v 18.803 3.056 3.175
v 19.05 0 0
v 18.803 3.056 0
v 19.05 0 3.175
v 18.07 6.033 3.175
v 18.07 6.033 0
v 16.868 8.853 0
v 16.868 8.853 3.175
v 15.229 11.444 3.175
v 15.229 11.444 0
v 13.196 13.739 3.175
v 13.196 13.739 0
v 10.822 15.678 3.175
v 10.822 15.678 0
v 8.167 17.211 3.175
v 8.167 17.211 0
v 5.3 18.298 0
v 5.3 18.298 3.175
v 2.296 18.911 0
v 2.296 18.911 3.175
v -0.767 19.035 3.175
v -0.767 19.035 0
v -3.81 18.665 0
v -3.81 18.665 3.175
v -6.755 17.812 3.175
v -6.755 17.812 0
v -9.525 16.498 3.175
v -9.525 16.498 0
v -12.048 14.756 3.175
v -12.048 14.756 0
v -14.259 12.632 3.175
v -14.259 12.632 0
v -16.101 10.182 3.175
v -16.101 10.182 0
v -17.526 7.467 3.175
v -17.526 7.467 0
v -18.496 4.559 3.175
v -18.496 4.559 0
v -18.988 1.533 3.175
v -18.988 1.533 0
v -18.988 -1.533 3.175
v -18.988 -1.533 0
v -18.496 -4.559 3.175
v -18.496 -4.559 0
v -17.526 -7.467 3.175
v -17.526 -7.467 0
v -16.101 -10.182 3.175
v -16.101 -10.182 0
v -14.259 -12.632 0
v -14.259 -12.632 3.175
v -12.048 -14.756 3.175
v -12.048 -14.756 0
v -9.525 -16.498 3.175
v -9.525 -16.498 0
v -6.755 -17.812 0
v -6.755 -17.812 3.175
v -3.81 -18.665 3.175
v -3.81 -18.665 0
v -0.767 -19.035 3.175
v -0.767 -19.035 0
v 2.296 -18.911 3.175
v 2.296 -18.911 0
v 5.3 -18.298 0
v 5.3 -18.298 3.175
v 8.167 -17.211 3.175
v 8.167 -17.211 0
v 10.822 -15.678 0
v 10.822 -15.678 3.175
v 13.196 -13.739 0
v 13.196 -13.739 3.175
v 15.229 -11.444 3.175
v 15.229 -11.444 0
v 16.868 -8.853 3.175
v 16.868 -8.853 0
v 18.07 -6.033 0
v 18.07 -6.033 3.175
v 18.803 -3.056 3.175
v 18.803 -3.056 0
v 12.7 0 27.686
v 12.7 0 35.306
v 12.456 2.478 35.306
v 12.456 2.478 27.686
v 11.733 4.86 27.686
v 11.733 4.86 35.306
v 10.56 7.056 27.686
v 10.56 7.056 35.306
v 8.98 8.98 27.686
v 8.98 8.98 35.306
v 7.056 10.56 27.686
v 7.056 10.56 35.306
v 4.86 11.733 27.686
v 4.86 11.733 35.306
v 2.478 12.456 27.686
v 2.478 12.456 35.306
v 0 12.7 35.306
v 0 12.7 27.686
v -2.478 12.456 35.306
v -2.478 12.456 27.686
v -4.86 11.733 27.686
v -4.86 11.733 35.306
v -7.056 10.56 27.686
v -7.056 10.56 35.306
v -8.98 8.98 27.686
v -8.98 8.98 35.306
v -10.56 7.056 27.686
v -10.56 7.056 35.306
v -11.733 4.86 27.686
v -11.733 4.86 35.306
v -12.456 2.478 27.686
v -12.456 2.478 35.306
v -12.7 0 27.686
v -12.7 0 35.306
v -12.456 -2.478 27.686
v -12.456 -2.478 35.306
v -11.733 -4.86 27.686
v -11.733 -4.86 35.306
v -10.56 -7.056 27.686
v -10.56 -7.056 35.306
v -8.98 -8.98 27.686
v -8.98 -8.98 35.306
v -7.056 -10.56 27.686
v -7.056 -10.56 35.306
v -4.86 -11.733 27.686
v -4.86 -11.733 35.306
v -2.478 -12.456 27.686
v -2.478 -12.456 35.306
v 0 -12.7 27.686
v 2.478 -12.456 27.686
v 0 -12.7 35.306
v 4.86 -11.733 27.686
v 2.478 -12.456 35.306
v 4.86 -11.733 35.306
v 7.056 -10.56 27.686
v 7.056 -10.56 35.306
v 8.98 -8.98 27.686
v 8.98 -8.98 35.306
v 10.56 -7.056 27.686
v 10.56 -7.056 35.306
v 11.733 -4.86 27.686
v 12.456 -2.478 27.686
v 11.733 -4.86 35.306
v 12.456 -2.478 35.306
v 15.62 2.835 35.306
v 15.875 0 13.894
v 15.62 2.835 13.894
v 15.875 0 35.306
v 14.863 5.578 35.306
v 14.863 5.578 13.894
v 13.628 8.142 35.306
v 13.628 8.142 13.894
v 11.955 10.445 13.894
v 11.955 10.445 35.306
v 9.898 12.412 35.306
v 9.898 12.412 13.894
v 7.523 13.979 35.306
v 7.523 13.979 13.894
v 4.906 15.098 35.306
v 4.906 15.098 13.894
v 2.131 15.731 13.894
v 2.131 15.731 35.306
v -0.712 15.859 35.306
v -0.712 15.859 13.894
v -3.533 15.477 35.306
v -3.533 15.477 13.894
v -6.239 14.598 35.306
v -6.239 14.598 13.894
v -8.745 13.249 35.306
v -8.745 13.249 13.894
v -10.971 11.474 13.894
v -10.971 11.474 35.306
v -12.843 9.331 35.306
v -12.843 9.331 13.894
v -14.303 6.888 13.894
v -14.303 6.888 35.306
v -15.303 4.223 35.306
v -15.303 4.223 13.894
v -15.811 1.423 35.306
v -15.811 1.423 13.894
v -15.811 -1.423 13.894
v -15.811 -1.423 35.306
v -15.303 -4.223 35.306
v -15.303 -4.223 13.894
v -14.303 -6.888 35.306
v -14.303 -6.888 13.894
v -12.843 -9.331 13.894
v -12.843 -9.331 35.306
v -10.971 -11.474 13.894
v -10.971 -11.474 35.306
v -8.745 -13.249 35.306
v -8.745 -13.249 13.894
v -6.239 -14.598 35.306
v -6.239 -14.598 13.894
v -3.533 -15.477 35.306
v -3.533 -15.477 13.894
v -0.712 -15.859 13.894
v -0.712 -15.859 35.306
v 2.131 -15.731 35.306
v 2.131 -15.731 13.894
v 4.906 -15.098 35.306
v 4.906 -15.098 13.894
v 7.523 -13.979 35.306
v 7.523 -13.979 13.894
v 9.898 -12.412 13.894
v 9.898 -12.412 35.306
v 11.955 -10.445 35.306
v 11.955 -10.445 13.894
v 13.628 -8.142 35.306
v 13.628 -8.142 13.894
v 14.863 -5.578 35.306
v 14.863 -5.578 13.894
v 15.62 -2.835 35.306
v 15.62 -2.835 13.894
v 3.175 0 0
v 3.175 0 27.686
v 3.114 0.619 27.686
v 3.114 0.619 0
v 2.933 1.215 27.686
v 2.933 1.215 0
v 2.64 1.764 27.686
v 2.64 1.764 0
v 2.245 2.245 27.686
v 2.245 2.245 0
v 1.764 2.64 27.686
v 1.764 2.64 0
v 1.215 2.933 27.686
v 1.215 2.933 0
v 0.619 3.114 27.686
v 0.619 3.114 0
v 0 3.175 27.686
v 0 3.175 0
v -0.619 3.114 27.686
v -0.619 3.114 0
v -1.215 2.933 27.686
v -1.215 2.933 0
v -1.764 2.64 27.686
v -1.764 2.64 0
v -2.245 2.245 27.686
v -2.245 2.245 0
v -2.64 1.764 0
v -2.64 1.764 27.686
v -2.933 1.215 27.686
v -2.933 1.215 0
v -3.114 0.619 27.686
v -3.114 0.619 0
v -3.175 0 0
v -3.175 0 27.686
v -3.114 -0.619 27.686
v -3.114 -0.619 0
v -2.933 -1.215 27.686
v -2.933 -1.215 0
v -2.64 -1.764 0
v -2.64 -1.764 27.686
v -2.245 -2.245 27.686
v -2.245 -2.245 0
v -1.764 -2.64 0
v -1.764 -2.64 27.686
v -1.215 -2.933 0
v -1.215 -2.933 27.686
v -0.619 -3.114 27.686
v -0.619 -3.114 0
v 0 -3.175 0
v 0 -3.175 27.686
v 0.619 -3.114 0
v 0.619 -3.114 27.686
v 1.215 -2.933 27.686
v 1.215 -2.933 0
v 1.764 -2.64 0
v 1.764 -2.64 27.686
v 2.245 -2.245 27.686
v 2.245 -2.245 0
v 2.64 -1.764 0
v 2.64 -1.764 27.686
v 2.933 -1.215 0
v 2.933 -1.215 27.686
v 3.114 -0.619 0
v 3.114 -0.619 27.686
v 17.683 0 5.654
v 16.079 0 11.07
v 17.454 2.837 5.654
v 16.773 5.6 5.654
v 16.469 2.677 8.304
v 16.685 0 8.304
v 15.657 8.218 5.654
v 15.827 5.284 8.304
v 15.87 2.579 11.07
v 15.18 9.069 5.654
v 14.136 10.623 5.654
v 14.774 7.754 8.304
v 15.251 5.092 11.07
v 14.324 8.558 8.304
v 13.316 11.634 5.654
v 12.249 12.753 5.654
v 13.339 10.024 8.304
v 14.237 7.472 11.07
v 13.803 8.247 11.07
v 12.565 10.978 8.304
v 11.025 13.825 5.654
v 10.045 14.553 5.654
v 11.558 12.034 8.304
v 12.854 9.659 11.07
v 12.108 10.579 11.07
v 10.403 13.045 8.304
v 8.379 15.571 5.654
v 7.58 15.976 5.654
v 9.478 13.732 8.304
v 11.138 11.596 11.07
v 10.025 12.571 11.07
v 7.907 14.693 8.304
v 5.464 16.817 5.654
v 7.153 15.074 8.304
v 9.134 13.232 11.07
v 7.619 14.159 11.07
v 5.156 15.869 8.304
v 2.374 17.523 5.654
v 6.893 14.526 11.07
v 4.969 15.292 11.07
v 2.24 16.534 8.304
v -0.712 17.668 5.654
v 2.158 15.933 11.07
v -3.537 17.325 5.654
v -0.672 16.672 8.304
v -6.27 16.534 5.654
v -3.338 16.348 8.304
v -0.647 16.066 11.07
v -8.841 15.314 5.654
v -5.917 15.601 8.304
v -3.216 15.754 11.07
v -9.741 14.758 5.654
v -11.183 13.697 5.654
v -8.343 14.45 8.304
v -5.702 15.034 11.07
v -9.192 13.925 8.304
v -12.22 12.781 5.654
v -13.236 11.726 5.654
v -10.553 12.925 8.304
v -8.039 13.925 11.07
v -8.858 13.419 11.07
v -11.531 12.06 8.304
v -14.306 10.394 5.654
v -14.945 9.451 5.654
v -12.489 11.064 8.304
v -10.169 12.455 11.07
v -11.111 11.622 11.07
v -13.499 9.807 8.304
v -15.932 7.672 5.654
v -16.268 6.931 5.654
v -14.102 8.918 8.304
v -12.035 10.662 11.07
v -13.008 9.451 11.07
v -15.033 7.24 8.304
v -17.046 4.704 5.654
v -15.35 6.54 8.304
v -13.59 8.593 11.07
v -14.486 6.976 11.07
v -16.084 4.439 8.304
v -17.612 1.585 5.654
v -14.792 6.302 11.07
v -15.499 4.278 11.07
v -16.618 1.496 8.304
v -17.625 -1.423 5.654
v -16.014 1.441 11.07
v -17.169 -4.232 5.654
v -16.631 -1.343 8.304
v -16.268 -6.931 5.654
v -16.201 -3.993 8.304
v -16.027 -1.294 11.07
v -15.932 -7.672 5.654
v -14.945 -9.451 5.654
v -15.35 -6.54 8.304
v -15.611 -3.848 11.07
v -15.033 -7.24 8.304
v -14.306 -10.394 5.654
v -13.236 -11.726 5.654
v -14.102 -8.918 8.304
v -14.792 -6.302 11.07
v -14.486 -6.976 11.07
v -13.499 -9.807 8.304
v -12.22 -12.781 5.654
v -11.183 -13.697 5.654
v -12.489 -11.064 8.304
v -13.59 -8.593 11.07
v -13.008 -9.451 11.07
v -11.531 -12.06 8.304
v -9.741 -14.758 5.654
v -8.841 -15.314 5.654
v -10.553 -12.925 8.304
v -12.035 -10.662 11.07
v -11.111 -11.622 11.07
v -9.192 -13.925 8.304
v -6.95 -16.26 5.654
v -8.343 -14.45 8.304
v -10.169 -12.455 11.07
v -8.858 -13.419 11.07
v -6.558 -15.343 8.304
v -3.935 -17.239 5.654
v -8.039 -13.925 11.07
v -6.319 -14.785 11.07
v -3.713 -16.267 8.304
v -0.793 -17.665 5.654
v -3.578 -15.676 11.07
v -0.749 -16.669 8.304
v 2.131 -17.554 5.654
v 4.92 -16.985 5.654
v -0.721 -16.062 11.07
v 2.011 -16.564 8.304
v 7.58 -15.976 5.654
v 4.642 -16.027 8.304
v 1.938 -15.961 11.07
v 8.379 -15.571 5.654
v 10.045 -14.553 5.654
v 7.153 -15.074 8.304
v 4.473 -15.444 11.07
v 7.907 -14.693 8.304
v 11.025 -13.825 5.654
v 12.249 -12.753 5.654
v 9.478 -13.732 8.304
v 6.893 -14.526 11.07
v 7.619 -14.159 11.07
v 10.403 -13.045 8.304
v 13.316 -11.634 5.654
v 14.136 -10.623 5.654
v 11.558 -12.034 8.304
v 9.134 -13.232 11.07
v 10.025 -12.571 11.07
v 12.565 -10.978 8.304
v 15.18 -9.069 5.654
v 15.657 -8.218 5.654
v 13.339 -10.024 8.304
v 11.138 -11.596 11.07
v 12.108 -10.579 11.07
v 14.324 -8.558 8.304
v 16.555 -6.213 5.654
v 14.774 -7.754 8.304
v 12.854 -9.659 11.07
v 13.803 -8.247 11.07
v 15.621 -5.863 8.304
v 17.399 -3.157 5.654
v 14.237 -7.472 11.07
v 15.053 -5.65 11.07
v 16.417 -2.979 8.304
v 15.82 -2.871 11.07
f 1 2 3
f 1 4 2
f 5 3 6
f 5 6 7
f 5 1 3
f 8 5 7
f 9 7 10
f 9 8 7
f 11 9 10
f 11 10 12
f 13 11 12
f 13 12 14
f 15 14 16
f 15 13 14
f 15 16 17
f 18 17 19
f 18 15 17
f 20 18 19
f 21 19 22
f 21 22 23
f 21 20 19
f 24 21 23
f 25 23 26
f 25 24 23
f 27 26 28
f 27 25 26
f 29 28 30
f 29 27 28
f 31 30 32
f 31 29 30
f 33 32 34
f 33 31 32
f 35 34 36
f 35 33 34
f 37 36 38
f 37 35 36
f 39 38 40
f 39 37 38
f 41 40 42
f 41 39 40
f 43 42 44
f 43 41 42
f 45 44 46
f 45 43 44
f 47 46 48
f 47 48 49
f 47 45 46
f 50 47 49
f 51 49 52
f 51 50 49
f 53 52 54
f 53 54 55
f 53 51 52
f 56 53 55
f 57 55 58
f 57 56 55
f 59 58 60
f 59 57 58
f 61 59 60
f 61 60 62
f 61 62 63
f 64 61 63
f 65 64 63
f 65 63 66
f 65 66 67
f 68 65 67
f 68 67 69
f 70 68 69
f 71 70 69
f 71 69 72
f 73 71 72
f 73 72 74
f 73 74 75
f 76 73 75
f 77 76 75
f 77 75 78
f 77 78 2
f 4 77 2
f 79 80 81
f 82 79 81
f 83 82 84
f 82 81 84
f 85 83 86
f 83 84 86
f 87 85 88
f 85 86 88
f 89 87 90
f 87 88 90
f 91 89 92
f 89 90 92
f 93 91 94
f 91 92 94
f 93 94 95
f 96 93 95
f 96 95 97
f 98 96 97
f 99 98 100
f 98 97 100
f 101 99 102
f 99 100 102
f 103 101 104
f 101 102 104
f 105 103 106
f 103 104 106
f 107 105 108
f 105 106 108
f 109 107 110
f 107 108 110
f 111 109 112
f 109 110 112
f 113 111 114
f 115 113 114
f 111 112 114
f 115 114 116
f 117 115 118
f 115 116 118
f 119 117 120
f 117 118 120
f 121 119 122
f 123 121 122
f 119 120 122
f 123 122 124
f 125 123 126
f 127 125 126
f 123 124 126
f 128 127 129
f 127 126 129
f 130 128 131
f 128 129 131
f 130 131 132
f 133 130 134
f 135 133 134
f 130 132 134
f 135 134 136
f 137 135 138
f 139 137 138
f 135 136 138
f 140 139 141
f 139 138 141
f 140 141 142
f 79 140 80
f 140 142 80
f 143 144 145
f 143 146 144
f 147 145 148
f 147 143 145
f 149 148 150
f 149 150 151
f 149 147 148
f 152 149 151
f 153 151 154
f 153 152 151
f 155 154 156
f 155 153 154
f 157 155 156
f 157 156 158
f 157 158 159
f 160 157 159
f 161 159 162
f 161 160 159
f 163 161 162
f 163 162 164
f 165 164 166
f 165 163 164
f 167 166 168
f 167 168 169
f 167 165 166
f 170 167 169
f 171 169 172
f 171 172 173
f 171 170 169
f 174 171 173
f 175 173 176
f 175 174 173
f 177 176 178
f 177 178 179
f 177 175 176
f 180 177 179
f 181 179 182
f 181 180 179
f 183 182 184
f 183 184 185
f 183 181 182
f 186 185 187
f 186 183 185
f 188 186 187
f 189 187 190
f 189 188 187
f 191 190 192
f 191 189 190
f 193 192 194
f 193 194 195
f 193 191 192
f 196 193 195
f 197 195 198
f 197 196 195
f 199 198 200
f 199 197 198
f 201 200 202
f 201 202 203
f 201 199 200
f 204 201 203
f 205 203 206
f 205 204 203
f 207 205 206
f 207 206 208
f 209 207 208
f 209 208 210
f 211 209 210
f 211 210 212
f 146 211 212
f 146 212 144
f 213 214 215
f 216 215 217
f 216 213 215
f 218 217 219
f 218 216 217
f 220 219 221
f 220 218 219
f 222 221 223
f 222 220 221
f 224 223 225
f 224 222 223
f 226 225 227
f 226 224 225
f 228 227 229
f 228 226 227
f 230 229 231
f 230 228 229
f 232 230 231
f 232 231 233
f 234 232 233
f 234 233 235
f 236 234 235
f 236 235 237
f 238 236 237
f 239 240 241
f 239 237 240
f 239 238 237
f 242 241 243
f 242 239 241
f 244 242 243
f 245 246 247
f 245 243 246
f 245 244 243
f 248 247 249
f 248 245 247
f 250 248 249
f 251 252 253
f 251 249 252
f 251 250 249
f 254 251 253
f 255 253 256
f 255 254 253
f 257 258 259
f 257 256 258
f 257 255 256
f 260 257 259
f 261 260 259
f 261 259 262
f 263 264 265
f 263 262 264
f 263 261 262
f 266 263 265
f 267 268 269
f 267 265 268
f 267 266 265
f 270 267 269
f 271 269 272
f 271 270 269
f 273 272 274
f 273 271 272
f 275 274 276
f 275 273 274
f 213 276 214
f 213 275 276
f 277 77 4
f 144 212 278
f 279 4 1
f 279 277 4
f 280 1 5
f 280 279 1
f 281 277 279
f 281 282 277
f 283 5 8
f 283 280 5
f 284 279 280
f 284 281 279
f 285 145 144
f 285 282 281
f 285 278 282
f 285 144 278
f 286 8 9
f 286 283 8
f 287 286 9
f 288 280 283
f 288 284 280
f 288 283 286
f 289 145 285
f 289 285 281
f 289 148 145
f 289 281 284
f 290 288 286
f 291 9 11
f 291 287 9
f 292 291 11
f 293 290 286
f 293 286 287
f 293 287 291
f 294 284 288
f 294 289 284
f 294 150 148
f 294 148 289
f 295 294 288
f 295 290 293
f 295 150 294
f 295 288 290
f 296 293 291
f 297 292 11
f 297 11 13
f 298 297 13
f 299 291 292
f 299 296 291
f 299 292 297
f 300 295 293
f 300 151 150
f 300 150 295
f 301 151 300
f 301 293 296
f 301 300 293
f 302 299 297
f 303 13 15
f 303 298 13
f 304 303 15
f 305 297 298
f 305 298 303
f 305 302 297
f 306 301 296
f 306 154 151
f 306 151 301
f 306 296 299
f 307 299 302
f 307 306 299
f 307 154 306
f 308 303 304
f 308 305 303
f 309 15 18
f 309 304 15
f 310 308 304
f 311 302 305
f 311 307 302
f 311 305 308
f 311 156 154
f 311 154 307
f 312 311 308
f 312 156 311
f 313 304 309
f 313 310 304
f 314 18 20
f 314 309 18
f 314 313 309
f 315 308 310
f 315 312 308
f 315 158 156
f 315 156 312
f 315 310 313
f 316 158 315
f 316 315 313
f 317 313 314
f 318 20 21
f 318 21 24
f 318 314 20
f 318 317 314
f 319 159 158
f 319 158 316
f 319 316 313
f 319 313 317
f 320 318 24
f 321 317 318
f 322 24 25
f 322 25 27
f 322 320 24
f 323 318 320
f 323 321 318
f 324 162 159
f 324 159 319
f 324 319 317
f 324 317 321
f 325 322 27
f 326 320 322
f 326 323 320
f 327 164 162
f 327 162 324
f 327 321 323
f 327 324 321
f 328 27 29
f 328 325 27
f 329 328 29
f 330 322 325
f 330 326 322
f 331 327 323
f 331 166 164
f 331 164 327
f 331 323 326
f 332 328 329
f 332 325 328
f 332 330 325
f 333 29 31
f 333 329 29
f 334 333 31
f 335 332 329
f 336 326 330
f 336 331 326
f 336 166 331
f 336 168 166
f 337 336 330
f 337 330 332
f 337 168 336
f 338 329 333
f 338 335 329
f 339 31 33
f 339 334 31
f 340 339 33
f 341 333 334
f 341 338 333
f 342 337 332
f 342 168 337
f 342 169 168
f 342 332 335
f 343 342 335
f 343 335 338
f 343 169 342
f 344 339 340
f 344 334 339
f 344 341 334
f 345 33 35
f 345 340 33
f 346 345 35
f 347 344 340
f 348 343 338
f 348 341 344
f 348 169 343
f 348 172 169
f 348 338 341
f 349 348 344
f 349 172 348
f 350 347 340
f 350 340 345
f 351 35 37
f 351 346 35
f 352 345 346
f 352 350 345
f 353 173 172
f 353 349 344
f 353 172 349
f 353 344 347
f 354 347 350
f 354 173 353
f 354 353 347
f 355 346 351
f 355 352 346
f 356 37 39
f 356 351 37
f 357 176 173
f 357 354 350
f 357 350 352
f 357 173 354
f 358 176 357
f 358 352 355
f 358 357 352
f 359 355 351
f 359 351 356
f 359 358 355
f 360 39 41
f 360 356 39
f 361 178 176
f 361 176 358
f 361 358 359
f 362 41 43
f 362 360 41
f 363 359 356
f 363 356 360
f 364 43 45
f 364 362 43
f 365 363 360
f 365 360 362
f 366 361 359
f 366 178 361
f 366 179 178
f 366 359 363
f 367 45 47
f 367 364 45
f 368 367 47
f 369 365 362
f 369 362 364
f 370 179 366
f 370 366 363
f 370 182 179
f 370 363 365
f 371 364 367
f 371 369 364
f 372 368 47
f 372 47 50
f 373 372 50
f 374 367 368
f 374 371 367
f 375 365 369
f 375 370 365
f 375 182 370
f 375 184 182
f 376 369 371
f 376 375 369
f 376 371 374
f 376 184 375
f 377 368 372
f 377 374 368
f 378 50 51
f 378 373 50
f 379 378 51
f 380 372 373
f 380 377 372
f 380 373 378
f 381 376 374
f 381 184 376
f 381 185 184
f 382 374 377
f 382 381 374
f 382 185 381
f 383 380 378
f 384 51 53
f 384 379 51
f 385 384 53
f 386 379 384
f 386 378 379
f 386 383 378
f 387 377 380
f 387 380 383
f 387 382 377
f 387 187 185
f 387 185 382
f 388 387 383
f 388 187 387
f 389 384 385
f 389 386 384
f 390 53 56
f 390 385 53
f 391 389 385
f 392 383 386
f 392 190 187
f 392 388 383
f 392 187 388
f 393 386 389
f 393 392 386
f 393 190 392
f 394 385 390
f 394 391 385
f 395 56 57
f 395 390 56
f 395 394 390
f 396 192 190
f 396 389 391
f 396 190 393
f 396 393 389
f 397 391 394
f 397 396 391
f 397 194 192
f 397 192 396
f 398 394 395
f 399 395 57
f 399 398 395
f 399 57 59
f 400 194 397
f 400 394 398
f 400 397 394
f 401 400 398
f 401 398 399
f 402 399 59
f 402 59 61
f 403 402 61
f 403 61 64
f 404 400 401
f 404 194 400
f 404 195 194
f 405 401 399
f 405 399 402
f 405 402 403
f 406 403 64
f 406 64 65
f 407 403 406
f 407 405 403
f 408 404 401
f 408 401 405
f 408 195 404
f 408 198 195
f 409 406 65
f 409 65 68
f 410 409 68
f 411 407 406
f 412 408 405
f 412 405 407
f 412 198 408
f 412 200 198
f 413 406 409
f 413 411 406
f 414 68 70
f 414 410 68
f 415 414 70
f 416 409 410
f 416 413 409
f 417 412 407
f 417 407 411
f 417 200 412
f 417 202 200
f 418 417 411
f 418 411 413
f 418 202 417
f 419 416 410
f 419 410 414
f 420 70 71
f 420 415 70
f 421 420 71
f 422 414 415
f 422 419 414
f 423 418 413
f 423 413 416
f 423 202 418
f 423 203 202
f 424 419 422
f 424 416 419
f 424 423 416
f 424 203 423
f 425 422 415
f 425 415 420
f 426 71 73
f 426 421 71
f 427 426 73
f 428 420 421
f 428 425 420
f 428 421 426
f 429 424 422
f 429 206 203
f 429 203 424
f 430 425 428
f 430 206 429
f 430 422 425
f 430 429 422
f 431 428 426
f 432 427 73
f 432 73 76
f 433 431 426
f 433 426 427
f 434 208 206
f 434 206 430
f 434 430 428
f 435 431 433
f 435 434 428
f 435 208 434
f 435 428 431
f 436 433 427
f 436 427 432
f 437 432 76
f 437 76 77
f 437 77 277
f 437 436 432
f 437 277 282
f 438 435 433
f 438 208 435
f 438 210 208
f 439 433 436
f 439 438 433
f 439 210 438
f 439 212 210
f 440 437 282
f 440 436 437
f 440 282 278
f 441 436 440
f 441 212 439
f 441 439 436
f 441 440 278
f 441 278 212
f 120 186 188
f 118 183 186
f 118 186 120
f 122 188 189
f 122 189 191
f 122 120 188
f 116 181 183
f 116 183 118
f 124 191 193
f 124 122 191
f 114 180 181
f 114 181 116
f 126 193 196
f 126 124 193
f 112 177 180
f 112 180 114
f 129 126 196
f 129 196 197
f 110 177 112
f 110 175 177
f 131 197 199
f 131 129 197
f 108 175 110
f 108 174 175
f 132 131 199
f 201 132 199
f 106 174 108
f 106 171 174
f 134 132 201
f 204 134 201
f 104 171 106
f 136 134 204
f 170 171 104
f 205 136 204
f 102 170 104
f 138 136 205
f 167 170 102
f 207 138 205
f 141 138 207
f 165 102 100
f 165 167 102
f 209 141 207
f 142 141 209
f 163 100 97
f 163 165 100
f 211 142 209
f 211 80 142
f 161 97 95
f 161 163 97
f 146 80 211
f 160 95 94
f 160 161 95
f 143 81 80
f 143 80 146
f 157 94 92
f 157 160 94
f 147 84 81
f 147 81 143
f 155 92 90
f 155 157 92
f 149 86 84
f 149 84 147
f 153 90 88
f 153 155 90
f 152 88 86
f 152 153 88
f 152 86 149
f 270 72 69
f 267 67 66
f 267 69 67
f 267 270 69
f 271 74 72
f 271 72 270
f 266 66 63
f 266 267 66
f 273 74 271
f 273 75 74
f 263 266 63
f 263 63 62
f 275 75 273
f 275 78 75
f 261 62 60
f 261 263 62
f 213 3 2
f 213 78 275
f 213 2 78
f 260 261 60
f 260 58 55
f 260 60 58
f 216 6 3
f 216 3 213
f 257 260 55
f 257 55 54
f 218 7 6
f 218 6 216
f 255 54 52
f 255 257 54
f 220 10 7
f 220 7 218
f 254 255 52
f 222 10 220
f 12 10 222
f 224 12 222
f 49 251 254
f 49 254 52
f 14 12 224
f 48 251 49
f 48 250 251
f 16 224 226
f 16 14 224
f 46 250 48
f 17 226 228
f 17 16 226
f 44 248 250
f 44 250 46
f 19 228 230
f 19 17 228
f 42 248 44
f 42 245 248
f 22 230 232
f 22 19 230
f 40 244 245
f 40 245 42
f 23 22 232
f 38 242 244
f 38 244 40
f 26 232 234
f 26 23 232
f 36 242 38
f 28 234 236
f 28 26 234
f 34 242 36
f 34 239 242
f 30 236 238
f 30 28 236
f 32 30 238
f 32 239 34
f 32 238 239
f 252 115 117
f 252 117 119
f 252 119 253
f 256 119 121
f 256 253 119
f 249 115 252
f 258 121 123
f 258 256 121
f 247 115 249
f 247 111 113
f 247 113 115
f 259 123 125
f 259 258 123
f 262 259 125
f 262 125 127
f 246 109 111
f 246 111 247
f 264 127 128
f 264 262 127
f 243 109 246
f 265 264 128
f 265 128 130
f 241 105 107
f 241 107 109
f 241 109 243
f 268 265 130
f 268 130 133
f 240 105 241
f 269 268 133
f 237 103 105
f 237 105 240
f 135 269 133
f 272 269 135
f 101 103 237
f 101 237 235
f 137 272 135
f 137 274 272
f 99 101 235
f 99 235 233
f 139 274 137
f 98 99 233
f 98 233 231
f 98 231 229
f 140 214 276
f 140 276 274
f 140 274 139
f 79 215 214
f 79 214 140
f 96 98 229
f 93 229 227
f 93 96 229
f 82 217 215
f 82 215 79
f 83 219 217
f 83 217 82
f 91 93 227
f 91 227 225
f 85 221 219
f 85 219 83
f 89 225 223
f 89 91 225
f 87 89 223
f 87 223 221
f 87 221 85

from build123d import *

# Parameters (mm, degrees)
F2_R     = 12.7
F3_DEPTH = 7.62


with BuildPart() as f1:
    # F0 (on Front) → F1 (revolve)
    with BuildSketch(Plane.XZ):
        with BuildLine():
            Line((15.875, 35.306), (3.175, 35.306))
            Line((3.175, 35.306), (3.175, 0))
            Line((3.175, 0), (19.05, 0))
            Line((19.05, 0), (19.05, 3.175))
            ThreePointArc((19.05, 3.175), (16.685437, 8.304086), (15.875, 13.893529))
            Line((15.875, 13.893529), (15.875, 35.306))
        make_face()
    revolve(axis=Axis((0, 0, 26.439369), (0, 0, 1)))

    # F2 (on face) → F3 (cut)
    with BuildSketch(Plane.XY.offset(35.306)):
        Circle(F2_R)
    extrude(amount=-F3_DEPTH, mode=Mode.SUBTRACT)


solid = f1.part
